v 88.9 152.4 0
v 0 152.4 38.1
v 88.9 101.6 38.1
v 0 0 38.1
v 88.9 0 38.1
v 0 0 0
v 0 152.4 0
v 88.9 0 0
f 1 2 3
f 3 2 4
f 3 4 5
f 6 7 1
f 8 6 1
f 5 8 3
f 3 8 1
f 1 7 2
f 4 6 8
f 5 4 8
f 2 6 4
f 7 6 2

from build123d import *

# Parameters (mm, degrees)
SKETCH1_W           = 88.9
SKETCH1_H           = 152.4
BOSS_EXTRUDE1_DEPTH = 38.1


with BuildPart() as part:
    # Sketch1 → Boss-Extrude1 (new body)
    with BuildSketch(Plane.XY):
        with Locations((44.45, 76.2)):
            Rectangle(SKETCH1_W, SKETCH1_H)
    extrude(amount=BOSS_EXTRUDE1_DEPTH)

    # SurfaceCut1
    split(bisect_by=Plane(origin=(37.404236669, 65.457414171, 87.276552228), x_dir=(0.9459459459459459, -0.19459459459459455, -0.2594594594594596), z_dir=(0.3243243243243244, 0.5675675675675675, 0.7567567567567568)), keep=Keep.BOTTOM)


solid = part.part
